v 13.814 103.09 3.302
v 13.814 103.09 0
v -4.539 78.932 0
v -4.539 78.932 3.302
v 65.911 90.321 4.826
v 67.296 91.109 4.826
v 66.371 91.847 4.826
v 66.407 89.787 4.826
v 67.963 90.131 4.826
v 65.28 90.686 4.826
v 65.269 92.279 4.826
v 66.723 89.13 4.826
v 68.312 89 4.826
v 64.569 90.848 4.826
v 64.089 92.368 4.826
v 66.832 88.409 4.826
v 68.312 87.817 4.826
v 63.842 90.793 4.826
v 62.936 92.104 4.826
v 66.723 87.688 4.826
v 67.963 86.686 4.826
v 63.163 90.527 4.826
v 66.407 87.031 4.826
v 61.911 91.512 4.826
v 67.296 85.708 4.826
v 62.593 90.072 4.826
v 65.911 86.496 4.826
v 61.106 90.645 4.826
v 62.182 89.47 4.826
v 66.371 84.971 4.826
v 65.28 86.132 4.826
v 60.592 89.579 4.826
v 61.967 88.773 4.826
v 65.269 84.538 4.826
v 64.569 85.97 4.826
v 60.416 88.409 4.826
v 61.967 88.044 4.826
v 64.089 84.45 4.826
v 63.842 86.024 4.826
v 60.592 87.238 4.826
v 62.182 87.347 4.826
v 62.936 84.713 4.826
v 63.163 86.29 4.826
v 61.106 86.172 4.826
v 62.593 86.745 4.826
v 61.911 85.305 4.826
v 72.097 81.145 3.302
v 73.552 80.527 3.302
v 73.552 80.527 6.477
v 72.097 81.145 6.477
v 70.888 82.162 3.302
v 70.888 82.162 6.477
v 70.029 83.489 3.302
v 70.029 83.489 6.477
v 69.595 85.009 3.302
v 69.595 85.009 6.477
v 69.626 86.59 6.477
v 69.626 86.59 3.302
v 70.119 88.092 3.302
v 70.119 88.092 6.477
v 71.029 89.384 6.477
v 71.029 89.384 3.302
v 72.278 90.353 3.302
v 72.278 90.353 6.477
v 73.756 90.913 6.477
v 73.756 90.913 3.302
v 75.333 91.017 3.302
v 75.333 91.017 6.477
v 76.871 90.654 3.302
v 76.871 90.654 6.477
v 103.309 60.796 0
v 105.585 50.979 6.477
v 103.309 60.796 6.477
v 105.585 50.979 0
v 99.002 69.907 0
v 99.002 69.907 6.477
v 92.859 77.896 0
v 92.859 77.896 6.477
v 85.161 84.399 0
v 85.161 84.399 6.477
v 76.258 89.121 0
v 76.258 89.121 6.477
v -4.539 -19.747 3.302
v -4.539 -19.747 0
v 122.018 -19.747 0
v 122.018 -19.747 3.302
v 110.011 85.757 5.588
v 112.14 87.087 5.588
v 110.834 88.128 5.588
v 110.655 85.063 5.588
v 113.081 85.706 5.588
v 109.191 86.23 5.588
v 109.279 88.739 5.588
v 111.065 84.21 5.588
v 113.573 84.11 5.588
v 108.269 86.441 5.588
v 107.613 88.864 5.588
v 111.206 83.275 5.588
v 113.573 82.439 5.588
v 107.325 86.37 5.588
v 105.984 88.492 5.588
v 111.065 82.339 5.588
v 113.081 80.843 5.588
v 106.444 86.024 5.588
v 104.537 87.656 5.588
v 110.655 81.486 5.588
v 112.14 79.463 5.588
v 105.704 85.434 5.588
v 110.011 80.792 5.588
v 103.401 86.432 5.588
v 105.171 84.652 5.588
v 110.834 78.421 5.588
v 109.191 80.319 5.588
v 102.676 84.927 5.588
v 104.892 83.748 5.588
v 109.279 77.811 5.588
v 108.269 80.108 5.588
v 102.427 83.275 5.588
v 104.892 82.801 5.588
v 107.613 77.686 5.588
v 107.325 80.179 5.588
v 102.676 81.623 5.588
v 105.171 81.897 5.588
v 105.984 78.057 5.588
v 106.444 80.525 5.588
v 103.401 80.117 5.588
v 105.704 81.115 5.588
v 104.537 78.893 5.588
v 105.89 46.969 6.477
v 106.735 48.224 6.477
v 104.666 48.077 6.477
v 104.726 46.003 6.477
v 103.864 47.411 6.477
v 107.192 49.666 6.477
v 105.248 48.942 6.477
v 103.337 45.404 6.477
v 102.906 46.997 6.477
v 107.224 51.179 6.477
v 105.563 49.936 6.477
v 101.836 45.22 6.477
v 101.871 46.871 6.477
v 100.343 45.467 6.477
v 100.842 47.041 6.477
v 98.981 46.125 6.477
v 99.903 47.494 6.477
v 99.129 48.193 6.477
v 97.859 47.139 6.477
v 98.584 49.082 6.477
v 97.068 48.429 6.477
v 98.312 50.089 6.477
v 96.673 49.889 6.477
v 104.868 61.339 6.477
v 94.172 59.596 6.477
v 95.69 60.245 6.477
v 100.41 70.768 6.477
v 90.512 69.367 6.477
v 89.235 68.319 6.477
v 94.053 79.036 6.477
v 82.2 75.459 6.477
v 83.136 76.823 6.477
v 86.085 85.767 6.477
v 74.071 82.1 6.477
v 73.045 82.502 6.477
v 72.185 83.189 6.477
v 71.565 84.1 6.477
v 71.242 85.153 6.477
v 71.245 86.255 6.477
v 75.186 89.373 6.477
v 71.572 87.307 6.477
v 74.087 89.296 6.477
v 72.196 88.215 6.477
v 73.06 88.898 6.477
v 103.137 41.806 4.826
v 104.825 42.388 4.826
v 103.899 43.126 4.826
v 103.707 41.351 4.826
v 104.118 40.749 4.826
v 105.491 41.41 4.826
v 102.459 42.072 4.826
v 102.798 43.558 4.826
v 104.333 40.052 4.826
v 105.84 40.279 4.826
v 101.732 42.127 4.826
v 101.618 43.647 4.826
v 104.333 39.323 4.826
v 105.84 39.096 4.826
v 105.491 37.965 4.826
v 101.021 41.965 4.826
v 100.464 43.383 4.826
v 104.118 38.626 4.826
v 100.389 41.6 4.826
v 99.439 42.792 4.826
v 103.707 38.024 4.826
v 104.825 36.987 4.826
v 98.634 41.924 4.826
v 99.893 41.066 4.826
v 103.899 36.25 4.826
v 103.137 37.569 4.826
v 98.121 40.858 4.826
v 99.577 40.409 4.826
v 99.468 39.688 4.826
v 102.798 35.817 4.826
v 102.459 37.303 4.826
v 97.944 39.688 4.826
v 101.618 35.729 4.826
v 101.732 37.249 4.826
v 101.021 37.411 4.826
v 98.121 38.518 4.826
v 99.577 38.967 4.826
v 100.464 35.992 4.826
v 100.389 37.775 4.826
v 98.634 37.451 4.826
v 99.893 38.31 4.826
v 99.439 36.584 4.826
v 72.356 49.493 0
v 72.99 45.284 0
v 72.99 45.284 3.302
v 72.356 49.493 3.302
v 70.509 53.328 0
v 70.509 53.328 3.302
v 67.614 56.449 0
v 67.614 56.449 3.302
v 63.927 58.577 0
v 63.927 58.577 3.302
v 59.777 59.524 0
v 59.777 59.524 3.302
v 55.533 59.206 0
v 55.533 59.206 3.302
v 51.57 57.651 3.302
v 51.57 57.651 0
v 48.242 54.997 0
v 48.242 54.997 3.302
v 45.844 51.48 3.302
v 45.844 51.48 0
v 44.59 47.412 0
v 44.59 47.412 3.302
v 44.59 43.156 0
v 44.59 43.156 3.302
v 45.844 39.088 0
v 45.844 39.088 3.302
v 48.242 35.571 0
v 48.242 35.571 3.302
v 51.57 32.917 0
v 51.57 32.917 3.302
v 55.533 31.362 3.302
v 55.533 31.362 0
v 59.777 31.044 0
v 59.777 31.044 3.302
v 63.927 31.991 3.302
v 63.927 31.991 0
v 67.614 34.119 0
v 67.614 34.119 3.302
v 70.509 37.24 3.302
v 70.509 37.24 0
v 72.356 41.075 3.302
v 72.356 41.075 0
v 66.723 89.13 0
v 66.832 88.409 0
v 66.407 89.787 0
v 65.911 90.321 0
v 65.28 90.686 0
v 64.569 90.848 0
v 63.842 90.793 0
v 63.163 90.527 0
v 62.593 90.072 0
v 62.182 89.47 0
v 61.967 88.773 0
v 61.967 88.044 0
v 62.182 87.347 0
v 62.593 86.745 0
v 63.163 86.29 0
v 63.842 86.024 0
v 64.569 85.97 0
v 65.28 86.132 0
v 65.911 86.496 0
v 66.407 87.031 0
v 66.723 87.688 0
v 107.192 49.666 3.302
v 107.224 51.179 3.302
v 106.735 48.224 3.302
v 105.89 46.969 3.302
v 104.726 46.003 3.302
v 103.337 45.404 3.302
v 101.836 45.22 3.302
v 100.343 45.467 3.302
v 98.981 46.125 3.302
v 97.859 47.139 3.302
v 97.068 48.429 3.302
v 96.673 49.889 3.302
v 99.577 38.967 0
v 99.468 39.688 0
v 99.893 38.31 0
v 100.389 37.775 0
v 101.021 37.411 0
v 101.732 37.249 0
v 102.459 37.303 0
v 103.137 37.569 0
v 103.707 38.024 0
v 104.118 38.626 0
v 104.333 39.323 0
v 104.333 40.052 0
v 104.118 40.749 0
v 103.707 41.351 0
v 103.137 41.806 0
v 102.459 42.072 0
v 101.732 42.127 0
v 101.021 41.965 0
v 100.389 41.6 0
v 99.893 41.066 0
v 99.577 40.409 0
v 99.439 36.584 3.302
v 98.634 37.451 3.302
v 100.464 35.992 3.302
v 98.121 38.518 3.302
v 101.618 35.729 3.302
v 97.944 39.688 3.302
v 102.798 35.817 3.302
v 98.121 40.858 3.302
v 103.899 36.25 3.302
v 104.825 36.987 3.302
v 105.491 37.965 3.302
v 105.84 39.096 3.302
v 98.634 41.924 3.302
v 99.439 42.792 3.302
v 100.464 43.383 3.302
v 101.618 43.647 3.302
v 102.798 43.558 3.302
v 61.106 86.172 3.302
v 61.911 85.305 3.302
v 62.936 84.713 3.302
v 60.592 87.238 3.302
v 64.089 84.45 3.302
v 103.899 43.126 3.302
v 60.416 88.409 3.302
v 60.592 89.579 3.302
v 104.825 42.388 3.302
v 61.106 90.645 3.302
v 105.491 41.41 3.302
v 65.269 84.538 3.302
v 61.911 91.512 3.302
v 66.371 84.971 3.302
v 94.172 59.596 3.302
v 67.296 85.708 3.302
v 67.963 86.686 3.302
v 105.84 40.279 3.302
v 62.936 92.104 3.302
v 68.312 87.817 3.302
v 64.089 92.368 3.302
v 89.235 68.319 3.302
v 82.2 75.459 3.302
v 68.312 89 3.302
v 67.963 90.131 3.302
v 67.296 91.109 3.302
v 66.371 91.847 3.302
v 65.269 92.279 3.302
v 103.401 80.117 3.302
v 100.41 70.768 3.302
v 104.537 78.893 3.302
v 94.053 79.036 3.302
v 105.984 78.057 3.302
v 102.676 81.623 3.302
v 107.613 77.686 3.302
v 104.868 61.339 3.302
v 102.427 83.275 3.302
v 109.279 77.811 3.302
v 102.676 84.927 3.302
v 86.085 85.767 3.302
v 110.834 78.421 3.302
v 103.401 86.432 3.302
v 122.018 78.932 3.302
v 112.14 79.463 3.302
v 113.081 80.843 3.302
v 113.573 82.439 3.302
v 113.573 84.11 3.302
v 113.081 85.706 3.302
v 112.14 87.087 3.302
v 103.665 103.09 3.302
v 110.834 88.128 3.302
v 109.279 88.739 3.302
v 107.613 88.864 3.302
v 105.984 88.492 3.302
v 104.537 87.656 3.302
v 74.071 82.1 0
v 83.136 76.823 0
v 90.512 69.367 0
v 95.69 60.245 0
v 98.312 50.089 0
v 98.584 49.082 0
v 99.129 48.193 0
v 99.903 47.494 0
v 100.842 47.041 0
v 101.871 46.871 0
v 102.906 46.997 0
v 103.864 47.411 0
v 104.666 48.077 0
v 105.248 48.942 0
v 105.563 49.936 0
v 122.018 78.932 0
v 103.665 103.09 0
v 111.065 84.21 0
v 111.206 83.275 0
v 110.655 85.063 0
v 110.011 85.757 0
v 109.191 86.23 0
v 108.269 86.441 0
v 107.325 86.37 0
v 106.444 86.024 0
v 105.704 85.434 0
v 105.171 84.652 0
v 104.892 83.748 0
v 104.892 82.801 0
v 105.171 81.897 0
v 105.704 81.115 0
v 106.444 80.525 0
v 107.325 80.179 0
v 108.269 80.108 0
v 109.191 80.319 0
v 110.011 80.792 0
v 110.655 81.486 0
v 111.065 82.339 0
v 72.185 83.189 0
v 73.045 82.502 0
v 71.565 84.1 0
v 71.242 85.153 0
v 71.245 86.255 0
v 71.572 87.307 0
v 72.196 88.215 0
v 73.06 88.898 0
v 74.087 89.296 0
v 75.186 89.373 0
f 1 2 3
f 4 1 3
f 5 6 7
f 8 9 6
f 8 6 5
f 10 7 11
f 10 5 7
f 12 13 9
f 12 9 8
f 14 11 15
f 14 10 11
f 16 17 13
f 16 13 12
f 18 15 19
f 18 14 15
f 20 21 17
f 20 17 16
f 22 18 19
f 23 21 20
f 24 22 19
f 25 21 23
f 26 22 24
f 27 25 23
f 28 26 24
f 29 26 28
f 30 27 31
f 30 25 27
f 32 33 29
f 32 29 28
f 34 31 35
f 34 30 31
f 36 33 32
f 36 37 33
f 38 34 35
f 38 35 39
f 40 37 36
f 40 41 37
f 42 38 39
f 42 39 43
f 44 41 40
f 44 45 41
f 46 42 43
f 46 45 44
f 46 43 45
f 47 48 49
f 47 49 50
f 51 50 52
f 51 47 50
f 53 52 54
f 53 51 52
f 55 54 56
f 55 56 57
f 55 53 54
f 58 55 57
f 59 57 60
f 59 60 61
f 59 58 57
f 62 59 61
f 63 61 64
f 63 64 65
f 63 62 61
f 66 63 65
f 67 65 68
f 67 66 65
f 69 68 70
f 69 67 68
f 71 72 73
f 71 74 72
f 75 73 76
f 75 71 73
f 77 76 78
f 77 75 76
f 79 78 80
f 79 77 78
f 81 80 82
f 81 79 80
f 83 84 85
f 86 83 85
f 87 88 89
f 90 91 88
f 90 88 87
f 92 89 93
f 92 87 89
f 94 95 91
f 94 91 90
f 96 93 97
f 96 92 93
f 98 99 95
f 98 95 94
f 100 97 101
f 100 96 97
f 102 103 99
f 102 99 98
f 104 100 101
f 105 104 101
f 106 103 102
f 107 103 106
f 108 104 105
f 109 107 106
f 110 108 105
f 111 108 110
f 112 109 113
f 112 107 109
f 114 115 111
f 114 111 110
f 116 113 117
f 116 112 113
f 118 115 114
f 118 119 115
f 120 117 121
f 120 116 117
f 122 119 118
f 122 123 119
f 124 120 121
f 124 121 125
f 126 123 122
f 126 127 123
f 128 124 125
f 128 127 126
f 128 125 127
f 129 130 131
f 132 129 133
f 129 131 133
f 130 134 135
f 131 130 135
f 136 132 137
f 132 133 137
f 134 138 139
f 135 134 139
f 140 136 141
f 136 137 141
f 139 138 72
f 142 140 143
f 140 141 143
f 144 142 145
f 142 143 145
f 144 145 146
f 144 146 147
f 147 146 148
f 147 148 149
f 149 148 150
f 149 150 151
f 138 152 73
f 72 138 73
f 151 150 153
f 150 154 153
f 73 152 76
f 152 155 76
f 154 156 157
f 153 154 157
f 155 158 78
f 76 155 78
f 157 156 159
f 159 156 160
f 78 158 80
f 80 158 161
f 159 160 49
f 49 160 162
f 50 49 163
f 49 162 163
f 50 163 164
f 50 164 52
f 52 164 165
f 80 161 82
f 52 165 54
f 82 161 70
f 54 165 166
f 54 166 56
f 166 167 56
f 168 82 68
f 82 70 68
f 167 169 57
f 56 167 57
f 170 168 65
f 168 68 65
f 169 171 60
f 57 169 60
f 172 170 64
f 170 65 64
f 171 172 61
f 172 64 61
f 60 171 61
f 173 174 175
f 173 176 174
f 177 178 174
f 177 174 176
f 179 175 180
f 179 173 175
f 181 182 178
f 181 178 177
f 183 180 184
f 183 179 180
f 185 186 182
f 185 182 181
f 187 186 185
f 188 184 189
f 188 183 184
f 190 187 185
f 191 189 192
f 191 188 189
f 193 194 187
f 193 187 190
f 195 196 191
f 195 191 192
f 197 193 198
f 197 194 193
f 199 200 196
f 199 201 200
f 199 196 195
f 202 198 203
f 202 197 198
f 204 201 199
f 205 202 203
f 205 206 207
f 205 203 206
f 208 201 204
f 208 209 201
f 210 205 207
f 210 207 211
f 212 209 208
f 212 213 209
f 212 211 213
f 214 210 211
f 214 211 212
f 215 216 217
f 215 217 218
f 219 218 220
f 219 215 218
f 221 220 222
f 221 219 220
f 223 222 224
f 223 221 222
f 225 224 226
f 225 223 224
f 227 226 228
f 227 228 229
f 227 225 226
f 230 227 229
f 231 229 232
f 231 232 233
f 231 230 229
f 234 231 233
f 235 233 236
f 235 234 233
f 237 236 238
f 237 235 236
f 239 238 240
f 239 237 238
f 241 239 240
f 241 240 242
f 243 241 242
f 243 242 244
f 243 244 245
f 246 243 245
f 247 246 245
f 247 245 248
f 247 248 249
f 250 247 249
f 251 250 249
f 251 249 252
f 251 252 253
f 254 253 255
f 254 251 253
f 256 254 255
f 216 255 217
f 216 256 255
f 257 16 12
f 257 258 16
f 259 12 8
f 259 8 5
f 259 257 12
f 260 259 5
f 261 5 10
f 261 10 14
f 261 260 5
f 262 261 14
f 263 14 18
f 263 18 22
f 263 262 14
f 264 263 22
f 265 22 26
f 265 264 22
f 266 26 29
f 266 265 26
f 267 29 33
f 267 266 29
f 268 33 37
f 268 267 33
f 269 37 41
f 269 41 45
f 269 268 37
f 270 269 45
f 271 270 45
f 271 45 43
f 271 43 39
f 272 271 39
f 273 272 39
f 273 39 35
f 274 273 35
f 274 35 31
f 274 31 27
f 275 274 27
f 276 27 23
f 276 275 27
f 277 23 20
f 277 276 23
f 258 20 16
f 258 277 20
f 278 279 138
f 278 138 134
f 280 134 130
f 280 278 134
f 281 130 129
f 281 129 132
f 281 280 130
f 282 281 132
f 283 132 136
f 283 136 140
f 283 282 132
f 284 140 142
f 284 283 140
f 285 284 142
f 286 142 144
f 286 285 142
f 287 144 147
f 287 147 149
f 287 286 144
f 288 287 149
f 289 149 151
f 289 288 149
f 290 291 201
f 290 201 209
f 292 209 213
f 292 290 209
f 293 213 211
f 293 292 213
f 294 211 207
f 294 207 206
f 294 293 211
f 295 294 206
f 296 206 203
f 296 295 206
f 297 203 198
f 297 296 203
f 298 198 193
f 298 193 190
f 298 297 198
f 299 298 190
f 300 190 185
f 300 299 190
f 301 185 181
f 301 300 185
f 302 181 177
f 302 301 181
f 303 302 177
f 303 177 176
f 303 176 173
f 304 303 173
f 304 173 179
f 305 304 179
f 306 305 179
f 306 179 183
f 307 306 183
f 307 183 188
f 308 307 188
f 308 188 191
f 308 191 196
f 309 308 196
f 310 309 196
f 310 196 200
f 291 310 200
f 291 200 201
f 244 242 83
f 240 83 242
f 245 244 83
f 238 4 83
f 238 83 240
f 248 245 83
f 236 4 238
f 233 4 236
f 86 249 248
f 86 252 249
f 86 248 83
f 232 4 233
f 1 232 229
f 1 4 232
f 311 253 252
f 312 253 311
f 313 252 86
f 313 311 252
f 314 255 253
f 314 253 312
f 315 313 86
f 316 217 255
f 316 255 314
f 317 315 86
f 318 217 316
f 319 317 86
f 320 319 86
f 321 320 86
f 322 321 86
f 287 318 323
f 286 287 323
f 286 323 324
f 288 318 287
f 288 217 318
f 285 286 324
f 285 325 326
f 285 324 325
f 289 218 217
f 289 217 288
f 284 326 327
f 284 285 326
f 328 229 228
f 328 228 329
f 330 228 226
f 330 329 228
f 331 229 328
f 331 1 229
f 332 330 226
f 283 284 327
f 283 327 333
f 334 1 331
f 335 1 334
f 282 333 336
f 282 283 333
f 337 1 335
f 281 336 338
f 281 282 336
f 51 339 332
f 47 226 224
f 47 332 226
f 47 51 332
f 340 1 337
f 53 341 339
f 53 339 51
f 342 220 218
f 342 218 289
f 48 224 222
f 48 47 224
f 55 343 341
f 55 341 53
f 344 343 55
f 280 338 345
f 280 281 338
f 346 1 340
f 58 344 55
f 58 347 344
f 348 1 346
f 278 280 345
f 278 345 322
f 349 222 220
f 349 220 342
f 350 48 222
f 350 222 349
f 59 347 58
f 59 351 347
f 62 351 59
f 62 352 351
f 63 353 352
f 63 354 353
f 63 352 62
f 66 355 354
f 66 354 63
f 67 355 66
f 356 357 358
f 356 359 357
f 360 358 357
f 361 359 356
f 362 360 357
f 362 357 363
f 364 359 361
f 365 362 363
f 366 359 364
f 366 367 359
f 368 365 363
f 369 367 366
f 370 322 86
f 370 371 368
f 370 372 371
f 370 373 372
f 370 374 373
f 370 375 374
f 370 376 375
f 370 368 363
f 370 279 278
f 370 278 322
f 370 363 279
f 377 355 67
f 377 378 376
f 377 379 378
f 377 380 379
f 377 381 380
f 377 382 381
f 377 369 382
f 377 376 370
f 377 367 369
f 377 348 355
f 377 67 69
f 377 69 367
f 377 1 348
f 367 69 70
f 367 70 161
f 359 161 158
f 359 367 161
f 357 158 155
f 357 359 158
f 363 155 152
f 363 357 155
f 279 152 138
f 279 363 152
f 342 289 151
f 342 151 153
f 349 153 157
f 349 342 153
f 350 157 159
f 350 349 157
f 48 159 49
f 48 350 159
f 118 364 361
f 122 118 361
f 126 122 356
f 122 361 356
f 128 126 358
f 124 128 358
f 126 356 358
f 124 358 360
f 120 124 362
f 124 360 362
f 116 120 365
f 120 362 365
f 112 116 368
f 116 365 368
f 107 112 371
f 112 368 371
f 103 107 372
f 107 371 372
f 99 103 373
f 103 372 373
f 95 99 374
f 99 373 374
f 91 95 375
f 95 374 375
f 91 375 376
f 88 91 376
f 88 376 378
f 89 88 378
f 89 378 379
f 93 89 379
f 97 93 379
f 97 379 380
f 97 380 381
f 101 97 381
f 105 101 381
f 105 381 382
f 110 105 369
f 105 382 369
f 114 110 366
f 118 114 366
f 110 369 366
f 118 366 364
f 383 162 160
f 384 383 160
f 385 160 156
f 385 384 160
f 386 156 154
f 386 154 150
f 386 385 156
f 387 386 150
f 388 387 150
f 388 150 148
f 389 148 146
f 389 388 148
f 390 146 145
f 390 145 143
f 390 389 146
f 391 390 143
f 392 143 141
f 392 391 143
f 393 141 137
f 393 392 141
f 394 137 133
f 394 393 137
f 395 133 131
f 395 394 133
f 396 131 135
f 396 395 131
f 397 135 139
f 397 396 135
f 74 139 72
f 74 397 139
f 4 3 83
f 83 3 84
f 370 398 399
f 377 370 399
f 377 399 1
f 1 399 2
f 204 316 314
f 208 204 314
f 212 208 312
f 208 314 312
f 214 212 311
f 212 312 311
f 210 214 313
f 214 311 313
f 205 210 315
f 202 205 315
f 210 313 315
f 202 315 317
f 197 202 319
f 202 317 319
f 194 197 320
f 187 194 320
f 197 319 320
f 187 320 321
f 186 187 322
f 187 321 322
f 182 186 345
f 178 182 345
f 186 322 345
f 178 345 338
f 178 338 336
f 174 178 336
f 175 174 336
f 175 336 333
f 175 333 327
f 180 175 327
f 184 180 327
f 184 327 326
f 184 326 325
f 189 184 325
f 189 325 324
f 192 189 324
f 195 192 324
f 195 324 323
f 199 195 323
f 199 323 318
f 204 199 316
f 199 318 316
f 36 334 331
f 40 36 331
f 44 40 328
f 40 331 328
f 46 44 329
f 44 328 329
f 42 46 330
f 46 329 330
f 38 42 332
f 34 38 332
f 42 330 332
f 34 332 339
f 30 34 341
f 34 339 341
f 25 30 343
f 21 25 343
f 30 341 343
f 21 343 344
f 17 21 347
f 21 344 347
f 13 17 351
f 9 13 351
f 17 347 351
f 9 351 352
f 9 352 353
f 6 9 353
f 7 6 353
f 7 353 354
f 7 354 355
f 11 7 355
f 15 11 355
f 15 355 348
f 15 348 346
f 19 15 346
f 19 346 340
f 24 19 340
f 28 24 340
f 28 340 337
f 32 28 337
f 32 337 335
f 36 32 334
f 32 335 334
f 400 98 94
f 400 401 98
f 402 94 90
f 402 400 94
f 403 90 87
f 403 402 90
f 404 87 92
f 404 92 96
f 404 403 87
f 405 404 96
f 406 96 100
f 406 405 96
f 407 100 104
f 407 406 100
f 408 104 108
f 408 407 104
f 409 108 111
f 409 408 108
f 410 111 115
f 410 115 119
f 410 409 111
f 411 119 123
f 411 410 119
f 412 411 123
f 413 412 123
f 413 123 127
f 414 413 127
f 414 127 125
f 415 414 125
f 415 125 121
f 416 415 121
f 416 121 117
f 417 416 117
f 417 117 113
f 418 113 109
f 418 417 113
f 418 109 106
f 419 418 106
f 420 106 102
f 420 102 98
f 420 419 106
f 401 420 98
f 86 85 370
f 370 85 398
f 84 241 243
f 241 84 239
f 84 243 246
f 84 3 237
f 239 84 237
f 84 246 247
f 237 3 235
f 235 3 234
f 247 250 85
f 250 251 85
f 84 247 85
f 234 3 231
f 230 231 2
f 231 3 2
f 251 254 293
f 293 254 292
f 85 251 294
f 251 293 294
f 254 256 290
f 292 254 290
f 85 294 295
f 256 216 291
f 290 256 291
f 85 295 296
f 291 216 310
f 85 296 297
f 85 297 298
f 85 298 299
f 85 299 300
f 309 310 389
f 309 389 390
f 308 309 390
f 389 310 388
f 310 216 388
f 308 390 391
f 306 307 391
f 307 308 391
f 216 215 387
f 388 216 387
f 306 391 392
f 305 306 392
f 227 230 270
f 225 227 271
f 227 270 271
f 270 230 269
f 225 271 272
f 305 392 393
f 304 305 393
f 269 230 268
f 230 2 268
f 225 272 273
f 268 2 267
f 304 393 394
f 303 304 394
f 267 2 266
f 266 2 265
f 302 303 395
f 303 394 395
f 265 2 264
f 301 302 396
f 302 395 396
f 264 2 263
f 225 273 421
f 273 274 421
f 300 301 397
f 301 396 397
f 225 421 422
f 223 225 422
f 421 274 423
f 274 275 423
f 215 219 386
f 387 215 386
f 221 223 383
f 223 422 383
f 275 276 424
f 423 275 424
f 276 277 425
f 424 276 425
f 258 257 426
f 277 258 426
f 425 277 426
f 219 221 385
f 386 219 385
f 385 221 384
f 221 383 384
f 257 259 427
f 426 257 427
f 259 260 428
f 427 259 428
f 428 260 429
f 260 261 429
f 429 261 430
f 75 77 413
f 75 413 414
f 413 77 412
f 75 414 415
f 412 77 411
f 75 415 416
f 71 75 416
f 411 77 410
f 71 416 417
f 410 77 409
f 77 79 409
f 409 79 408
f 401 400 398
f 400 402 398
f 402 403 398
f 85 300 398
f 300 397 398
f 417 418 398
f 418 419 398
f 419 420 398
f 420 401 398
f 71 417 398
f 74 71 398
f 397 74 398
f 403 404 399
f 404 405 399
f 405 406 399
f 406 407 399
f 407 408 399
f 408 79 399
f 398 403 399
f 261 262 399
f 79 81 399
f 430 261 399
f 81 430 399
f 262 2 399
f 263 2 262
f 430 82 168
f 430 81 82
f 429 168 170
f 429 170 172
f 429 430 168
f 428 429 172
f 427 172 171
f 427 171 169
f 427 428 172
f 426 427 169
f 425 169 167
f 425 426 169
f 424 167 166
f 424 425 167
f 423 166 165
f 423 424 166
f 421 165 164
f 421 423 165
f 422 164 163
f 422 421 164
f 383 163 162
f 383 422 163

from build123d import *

# Parameters (mm, degrees)
SKETCH1_R      = 14.280154621
SKETCH1_R_2    = 3.175
SKETCH1_R_3    = 2.445943814
EXTRUDE1_DEPTH = 3.302
EXTRUDE2_DEPTH = 3.175
SKETCH3_R      = 3.969943814
SKETCH3_R_2    = 2.445943814
EXTRUDE3_DEPTH = 1.524
SKETCH4_R      = 5.604581629
SKETCH4_R_2    = 3.175
EXTRUDE4_DEPTH = 2.286


with BuildPart() as part:
    # Sketch1 → Extrude1 (new body)
    with BuildSketch(Plane.XY):
        Polygon((122.018241697, 78.932176277), (103.665120274, 103.090232189), (13.814462921, 103.090232189), (-4.538658503, 78.932176277), (-4.538658503, -19.747260734), (122.018241697, -19.747260734), align=None)
        with Locations((58.710249945, 45.283910371)):
            Circle(SKETCH1_R, mode=Mode.SUBTRACT)
        with Locations((108.031447678, 83.274598732)):
            Circle(SKETCH1_R_2, mode=Mode.SUBTRACT)
        with Locations((64.386022104, 88.408658993)):
            Circle(SKETCH1_R_3, mode=Mode.SUBTRACT)
        with Locations(Location((101.914361119, 39.6877037, 0), (0, 0, 180))):
            Circle(SKETCH1_R_3, mode=Mode.SUBTRACT)
        with BuildLine():
            ThreePointArc((105.584923307, 50.978901238), (96.144059082, 74.065464486), (76.258457488, 89.121432379))
            ThreePointArc((76.258457488, 89.121432379), (71.3691103, 86.793097674), (74.070723534, 82.099682674))
            ThreePointArc((74.070723534, 82.099682674), (90.512346787, 69.36651562), (98.311501424, 50.088712183))
            ThreePointArc((98.311501424, 50.088712183), (102.393306893, 46.897095769), (105.584923307, 50.978901238))
        make_face(mode=Mode.SUBTRACT)
    extrude(amount=EXTRUDE1_DEPTH)

    # Sketch2 → Extrude2 (add)
    with BuildSketch(Plane.XY.offset(3.302)):
        with BuildLine():
            ThreePointArc((96.672625226, 49.888999726), (89.234697097, 68.318816731), (73.552104701, 80.526896868))
            ThreePointArc((73.552104701, 80.526896868), (69.816708658, 87.358865324), (76.871357609, 90.654453557))
            ThreePointArc((76.871357609, 90.654453557), (97.452472431, 75.07236814), (107.223783381, 51.178746493))
            ThreePointArc((107.223783381, 51.178746493), (102.593085742, 45.258227686), (96.672625226, 49.888999726))
        make_face()
        with BuildLine():
            ThreePointArc((98.311501424, 50.088712183), (102.393306893, 46.897095769), (105.584923307, 50.978901238))
            ThreePointArc((105.584923307, 50.978901238), (96.144059082, 74.065464486), (76.258457488, 89.121432379))
            ThreePointArc((76.258457488, 89.121432379), (71.3691103, 86.793097674), (74.070723534, 82.099682674))
            ThreePointArc((74.070723534, 82.099682674), (90.512346787, 69.36651562), (98.311501424, 50.088712183))
        make_face(mode=Mode.SUBTRACT)
    extrude(amount=EXTRUDE2_DEPTH)

    # Sketch3 → Extrude3 (add)
    # profile 1 of 2: a face of its own
    with BuildSketch(Plane.XY.offset(3.302)):
        with Locations(Location((64.386022104, 88.408658993, 0), (0, 0, 180))):
            Circle(SKETCH3_R)
        with Locations((64.386022104, 88.408658993)):
            Circle(SKETCH3_R_2, mode=Mode.SUBTRACT)
    # profile 2 of 2: a face of its own
    with BuildSketch(Plane.XY.offset(3.302)):
        with Locations(Location((101.914361119, 39.6877037, 0), (0, 0, 180))):
            Circle(SKETCH3_R)
        with Locations(Location((101.914361119, 39.6877037, 0), (0, 0, 180))):
            Circle(SKETCH3_R_2, mode=Mode.SUBTRACT)
    extrude(amount=EXTRUDE3_DEPTH)

    # Sketch4 → Extrude4 (add)
    with BuildSketch(Plane.XY.offset(3.302)):
        with Locations(Location((108.031447678, 83.274598732, 0), (0, 0, 180))):
            Circle(SKETCH4_R)
        with Locations((108.031447678, 83.274598732)):
            Circle(SKETCH4_R_2, mode=Mode.SUBTRACT)
    extrude(amount=EXTRUDE4_DEPTH)


solid = part.part
